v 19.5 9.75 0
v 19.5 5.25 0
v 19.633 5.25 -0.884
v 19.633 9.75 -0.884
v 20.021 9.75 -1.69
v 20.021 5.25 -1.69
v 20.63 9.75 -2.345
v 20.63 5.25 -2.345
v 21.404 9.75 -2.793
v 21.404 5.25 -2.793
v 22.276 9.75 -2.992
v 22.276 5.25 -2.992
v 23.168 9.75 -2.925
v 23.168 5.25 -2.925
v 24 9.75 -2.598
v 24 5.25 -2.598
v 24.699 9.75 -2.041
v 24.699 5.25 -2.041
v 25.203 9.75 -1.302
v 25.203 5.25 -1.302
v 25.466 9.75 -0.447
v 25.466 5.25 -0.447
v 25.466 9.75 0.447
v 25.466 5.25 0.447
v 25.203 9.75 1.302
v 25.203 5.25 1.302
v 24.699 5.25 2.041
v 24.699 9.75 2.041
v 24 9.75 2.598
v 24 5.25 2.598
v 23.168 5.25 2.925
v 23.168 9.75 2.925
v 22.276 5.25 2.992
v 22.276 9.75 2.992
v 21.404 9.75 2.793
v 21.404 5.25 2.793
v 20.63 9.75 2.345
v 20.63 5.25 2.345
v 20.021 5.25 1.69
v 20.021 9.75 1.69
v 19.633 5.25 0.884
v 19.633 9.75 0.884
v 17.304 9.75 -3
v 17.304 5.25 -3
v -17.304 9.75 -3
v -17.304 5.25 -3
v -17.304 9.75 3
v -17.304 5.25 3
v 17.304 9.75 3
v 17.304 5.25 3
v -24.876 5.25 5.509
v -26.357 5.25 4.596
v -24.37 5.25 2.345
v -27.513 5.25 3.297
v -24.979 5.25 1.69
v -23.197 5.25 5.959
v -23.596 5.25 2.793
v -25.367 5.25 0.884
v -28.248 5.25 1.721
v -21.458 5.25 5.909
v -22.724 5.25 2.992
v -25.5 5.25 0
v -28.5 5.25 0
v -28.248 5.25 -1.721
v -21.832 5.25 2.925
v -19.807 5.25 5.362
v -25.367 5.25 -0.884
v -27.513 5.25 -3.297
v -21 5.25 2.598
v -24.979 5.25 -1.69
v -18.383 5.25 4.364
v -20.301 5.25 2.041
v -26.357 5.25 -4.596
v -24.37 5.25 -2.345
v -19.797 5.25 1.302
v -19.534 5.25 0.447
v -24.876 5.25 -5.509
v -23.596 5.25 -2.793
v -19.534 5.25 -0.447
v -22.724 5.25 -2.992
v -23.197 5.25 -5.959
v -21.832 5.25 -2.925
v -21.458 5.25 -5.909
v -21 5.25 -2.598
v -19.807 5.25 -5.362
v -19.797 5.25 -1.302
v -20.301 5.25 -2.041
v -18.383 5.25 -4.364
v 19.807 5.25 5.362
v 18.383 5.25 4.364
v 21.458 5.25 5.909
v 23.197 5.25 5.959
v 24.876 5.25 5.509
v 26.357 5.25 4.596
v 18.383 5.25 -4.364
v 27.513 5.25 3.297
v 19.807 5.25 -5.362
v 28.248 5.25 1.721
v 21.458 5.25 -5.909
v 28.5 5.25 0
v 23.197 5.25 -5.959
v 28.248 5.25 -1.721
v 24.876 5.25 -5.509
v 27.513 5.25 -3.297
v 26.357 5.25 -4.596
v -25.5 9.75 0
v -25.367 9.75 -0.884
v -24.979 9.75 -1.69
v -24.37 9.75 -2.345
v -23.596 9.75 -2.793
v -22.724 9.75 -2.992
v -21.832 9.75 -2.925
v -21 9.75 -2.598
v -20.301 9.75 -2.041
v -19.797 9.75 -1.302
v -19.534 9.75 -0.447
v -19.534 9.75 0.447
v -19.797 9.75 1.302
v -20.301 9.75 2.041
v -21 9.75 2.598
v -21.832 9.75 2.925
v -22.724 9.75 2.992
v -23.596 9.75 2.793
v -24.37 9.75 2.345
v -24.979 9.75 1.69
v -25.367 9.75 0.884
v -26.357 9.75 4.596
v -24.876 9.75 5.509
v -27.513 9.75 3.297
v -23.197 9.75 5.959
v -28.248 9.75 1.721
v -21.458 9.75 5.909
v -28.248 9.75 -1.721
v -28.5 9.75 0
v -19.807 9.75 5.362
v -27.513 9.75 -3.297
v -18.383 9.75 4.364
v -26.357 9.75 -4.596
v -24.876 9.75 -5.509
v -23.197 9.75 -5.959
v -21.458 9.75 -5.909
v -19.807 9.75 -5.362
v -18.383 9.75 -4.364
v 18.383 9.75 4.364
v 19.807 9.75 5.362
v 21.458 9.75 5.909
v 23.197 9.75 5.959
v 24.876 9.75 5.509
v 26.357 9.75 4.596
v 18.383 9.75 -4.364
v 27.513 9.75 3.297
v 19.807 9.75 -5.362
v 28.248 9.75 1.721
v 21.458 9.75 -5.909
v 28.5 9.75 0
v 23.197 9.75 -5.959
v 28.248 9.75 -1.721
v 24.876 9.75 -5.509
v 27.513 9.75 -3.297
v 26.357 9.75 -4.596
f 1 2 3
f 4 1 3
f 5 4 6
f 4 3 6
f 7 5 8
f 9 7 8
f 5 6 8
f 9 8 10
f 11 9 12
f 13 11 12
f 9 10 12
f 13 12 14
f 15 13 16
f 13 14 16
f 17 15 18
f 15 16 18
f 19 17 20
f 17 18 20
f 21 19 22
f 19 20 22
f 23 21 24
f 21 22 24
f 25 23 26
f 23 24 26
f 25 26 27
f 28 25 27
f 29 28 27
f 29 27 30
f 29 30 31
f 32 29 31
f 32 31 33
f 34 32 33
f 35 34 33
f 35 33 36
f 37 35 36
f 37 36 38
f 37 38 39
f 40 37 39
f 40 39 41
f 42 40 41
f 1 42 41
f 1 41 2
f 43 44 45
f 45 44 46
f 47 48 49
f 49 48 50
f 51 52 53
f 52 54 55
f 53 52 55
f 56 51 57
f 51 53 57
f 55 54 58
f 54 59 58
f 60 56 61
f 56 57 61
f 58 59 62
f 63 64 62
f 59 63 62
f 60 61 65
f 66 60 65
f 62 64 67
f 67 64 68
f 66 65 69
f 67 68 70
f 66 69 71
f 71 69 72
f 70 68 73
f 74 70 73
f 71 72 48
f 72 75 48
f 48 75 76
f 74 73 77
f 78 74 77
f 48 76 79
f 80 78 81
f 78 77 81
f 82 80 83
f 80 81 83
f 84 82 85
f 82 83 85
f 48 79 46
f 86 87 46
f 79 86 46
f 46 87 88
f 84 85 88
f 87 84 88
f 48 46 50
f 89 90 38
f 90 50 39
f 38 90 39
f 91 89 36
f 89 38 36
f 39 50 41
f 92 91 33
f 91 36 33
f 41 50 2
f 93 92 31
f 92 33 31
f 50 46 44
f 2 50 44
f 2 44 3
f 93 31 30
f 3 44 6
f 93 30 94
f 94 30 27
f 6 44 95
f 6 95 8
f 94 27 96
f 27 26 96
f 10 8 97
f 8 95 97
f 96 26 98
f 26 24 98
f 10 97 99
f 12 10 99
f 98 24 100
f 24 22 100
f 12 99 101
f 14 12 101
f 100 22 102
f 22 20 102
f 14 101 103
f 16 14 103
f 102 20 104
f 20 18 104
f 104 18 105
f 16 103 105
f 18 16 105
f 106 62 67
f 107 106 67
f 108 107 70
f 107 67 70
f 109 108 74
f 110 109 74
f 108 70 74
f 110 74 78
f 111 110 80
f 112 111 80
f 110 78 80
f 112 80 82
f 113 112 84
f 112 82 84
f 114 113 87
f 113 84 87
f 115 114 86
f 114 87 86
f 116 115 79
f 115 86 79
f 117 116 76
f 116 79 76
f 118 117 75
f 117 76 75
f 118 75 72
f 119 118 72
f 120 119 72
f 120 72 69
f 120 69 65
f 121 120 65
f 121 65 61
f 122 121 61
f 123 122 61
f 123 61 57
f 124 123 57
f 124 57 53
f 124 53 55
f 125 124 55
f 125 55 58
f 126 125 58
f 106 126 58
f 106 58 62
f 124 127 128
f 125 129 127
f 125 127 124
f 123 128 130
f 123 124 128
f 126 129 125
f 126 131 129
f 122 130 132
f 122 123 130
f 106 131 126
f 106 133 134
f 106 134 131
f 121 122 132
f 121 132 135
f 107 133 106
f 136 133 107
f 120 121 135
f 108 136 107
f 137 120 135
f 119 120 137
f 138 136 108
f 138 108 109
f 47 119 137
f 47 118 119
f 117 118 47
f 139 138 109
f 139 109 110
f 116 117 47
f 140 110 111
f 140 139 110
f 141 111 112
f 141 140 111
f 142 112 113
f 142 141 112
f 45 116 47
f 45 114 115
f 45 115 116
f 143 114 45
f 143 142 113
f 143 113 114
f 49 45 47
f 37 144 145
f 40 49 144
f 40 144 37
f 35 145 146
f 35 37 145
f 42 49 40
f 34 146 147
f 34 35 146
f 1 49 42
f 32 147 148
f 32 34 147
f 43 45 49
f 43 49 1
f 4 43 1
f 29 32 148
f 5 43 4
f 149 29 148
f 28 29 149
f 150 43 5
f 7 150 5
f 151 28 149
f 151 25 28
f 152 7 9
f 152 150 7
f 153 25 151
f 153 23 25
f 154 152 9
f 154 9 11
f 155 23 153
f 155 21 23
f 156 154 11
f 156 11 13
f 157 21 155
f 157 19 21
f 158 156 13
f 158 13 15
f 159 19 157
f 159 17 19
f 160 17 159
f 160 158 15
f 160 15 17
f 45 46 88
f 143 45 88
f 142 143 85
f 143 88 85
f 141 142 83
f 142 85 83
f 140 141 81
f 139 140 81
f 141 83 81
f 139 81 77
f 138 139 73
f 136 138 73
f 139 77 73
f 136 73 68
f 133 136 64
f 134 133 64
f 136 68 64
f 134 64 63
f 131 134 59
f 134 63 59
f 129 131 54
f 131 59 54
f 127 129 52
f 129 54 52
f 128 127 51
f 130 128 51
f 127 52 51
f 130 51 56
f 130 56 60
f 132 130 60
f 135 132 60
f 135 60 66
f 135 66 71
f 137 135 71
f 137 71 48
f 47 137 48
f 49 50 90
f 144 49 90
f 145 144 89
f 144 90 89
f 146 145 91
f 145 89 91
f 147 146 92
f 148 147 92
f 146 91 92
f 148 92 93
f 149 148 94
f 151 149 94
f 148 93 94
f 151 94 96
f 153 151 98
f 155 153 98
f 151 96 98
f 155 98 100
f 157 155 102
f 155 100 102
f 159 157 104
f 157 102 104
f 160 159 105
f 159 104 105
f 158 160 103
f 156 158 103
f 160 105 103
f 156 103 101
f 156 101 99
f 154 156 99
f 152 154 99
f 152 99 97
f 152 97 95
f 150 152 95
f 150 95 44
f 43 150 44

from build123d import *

# Parameters (mm, degrees)
BOSS_EXTRUDE1_DEPTH = 15
F_20_0MM_1_D        = 20
SCALE_1_SCALE       = 0.3


with BuildPart() as part:
    # Sketch1 → Boss-Extrude1 (new body)
    with BuildSketch(Plane(origin=(0, 0, 0), x_dir=(1, 0, 0), z_dir=(0, 1, 0))):
        with BuildLine():
            Line((57.679491924, 10), (-57.679491924, 10))
            ThreePointArc((-57.679491924, 10), (-95, 0), (-57.679491924, -10))
            Line((-57.679491924, -10), (57.679491924, -10))
            ThreePointArc((57.679491924, -10), (95, 0), (57.679491924, 10))
        make_face()
    extrude(amount=BOSS_EXTRUDE1_DEPTH)

    # Ø20.0mm 맞춤핀 구멍1 (through all)
    with Locations(Plane(origin=(0, 15, 0), x_dir=(1, 0, 0), z_dir=(0, 1, 0))):
        with Locations((-75, 0), (75, 0)):
            Hole(F_20_0MM_1_D / 2)


with BuildPart() as part_1:
    # 축척1: scaled about (0, 7.5, 0)
    add(part.part.scale(SCALE_1_SCALE).moved(Location((0, 5.25, 0))))


solid = part_1.part
